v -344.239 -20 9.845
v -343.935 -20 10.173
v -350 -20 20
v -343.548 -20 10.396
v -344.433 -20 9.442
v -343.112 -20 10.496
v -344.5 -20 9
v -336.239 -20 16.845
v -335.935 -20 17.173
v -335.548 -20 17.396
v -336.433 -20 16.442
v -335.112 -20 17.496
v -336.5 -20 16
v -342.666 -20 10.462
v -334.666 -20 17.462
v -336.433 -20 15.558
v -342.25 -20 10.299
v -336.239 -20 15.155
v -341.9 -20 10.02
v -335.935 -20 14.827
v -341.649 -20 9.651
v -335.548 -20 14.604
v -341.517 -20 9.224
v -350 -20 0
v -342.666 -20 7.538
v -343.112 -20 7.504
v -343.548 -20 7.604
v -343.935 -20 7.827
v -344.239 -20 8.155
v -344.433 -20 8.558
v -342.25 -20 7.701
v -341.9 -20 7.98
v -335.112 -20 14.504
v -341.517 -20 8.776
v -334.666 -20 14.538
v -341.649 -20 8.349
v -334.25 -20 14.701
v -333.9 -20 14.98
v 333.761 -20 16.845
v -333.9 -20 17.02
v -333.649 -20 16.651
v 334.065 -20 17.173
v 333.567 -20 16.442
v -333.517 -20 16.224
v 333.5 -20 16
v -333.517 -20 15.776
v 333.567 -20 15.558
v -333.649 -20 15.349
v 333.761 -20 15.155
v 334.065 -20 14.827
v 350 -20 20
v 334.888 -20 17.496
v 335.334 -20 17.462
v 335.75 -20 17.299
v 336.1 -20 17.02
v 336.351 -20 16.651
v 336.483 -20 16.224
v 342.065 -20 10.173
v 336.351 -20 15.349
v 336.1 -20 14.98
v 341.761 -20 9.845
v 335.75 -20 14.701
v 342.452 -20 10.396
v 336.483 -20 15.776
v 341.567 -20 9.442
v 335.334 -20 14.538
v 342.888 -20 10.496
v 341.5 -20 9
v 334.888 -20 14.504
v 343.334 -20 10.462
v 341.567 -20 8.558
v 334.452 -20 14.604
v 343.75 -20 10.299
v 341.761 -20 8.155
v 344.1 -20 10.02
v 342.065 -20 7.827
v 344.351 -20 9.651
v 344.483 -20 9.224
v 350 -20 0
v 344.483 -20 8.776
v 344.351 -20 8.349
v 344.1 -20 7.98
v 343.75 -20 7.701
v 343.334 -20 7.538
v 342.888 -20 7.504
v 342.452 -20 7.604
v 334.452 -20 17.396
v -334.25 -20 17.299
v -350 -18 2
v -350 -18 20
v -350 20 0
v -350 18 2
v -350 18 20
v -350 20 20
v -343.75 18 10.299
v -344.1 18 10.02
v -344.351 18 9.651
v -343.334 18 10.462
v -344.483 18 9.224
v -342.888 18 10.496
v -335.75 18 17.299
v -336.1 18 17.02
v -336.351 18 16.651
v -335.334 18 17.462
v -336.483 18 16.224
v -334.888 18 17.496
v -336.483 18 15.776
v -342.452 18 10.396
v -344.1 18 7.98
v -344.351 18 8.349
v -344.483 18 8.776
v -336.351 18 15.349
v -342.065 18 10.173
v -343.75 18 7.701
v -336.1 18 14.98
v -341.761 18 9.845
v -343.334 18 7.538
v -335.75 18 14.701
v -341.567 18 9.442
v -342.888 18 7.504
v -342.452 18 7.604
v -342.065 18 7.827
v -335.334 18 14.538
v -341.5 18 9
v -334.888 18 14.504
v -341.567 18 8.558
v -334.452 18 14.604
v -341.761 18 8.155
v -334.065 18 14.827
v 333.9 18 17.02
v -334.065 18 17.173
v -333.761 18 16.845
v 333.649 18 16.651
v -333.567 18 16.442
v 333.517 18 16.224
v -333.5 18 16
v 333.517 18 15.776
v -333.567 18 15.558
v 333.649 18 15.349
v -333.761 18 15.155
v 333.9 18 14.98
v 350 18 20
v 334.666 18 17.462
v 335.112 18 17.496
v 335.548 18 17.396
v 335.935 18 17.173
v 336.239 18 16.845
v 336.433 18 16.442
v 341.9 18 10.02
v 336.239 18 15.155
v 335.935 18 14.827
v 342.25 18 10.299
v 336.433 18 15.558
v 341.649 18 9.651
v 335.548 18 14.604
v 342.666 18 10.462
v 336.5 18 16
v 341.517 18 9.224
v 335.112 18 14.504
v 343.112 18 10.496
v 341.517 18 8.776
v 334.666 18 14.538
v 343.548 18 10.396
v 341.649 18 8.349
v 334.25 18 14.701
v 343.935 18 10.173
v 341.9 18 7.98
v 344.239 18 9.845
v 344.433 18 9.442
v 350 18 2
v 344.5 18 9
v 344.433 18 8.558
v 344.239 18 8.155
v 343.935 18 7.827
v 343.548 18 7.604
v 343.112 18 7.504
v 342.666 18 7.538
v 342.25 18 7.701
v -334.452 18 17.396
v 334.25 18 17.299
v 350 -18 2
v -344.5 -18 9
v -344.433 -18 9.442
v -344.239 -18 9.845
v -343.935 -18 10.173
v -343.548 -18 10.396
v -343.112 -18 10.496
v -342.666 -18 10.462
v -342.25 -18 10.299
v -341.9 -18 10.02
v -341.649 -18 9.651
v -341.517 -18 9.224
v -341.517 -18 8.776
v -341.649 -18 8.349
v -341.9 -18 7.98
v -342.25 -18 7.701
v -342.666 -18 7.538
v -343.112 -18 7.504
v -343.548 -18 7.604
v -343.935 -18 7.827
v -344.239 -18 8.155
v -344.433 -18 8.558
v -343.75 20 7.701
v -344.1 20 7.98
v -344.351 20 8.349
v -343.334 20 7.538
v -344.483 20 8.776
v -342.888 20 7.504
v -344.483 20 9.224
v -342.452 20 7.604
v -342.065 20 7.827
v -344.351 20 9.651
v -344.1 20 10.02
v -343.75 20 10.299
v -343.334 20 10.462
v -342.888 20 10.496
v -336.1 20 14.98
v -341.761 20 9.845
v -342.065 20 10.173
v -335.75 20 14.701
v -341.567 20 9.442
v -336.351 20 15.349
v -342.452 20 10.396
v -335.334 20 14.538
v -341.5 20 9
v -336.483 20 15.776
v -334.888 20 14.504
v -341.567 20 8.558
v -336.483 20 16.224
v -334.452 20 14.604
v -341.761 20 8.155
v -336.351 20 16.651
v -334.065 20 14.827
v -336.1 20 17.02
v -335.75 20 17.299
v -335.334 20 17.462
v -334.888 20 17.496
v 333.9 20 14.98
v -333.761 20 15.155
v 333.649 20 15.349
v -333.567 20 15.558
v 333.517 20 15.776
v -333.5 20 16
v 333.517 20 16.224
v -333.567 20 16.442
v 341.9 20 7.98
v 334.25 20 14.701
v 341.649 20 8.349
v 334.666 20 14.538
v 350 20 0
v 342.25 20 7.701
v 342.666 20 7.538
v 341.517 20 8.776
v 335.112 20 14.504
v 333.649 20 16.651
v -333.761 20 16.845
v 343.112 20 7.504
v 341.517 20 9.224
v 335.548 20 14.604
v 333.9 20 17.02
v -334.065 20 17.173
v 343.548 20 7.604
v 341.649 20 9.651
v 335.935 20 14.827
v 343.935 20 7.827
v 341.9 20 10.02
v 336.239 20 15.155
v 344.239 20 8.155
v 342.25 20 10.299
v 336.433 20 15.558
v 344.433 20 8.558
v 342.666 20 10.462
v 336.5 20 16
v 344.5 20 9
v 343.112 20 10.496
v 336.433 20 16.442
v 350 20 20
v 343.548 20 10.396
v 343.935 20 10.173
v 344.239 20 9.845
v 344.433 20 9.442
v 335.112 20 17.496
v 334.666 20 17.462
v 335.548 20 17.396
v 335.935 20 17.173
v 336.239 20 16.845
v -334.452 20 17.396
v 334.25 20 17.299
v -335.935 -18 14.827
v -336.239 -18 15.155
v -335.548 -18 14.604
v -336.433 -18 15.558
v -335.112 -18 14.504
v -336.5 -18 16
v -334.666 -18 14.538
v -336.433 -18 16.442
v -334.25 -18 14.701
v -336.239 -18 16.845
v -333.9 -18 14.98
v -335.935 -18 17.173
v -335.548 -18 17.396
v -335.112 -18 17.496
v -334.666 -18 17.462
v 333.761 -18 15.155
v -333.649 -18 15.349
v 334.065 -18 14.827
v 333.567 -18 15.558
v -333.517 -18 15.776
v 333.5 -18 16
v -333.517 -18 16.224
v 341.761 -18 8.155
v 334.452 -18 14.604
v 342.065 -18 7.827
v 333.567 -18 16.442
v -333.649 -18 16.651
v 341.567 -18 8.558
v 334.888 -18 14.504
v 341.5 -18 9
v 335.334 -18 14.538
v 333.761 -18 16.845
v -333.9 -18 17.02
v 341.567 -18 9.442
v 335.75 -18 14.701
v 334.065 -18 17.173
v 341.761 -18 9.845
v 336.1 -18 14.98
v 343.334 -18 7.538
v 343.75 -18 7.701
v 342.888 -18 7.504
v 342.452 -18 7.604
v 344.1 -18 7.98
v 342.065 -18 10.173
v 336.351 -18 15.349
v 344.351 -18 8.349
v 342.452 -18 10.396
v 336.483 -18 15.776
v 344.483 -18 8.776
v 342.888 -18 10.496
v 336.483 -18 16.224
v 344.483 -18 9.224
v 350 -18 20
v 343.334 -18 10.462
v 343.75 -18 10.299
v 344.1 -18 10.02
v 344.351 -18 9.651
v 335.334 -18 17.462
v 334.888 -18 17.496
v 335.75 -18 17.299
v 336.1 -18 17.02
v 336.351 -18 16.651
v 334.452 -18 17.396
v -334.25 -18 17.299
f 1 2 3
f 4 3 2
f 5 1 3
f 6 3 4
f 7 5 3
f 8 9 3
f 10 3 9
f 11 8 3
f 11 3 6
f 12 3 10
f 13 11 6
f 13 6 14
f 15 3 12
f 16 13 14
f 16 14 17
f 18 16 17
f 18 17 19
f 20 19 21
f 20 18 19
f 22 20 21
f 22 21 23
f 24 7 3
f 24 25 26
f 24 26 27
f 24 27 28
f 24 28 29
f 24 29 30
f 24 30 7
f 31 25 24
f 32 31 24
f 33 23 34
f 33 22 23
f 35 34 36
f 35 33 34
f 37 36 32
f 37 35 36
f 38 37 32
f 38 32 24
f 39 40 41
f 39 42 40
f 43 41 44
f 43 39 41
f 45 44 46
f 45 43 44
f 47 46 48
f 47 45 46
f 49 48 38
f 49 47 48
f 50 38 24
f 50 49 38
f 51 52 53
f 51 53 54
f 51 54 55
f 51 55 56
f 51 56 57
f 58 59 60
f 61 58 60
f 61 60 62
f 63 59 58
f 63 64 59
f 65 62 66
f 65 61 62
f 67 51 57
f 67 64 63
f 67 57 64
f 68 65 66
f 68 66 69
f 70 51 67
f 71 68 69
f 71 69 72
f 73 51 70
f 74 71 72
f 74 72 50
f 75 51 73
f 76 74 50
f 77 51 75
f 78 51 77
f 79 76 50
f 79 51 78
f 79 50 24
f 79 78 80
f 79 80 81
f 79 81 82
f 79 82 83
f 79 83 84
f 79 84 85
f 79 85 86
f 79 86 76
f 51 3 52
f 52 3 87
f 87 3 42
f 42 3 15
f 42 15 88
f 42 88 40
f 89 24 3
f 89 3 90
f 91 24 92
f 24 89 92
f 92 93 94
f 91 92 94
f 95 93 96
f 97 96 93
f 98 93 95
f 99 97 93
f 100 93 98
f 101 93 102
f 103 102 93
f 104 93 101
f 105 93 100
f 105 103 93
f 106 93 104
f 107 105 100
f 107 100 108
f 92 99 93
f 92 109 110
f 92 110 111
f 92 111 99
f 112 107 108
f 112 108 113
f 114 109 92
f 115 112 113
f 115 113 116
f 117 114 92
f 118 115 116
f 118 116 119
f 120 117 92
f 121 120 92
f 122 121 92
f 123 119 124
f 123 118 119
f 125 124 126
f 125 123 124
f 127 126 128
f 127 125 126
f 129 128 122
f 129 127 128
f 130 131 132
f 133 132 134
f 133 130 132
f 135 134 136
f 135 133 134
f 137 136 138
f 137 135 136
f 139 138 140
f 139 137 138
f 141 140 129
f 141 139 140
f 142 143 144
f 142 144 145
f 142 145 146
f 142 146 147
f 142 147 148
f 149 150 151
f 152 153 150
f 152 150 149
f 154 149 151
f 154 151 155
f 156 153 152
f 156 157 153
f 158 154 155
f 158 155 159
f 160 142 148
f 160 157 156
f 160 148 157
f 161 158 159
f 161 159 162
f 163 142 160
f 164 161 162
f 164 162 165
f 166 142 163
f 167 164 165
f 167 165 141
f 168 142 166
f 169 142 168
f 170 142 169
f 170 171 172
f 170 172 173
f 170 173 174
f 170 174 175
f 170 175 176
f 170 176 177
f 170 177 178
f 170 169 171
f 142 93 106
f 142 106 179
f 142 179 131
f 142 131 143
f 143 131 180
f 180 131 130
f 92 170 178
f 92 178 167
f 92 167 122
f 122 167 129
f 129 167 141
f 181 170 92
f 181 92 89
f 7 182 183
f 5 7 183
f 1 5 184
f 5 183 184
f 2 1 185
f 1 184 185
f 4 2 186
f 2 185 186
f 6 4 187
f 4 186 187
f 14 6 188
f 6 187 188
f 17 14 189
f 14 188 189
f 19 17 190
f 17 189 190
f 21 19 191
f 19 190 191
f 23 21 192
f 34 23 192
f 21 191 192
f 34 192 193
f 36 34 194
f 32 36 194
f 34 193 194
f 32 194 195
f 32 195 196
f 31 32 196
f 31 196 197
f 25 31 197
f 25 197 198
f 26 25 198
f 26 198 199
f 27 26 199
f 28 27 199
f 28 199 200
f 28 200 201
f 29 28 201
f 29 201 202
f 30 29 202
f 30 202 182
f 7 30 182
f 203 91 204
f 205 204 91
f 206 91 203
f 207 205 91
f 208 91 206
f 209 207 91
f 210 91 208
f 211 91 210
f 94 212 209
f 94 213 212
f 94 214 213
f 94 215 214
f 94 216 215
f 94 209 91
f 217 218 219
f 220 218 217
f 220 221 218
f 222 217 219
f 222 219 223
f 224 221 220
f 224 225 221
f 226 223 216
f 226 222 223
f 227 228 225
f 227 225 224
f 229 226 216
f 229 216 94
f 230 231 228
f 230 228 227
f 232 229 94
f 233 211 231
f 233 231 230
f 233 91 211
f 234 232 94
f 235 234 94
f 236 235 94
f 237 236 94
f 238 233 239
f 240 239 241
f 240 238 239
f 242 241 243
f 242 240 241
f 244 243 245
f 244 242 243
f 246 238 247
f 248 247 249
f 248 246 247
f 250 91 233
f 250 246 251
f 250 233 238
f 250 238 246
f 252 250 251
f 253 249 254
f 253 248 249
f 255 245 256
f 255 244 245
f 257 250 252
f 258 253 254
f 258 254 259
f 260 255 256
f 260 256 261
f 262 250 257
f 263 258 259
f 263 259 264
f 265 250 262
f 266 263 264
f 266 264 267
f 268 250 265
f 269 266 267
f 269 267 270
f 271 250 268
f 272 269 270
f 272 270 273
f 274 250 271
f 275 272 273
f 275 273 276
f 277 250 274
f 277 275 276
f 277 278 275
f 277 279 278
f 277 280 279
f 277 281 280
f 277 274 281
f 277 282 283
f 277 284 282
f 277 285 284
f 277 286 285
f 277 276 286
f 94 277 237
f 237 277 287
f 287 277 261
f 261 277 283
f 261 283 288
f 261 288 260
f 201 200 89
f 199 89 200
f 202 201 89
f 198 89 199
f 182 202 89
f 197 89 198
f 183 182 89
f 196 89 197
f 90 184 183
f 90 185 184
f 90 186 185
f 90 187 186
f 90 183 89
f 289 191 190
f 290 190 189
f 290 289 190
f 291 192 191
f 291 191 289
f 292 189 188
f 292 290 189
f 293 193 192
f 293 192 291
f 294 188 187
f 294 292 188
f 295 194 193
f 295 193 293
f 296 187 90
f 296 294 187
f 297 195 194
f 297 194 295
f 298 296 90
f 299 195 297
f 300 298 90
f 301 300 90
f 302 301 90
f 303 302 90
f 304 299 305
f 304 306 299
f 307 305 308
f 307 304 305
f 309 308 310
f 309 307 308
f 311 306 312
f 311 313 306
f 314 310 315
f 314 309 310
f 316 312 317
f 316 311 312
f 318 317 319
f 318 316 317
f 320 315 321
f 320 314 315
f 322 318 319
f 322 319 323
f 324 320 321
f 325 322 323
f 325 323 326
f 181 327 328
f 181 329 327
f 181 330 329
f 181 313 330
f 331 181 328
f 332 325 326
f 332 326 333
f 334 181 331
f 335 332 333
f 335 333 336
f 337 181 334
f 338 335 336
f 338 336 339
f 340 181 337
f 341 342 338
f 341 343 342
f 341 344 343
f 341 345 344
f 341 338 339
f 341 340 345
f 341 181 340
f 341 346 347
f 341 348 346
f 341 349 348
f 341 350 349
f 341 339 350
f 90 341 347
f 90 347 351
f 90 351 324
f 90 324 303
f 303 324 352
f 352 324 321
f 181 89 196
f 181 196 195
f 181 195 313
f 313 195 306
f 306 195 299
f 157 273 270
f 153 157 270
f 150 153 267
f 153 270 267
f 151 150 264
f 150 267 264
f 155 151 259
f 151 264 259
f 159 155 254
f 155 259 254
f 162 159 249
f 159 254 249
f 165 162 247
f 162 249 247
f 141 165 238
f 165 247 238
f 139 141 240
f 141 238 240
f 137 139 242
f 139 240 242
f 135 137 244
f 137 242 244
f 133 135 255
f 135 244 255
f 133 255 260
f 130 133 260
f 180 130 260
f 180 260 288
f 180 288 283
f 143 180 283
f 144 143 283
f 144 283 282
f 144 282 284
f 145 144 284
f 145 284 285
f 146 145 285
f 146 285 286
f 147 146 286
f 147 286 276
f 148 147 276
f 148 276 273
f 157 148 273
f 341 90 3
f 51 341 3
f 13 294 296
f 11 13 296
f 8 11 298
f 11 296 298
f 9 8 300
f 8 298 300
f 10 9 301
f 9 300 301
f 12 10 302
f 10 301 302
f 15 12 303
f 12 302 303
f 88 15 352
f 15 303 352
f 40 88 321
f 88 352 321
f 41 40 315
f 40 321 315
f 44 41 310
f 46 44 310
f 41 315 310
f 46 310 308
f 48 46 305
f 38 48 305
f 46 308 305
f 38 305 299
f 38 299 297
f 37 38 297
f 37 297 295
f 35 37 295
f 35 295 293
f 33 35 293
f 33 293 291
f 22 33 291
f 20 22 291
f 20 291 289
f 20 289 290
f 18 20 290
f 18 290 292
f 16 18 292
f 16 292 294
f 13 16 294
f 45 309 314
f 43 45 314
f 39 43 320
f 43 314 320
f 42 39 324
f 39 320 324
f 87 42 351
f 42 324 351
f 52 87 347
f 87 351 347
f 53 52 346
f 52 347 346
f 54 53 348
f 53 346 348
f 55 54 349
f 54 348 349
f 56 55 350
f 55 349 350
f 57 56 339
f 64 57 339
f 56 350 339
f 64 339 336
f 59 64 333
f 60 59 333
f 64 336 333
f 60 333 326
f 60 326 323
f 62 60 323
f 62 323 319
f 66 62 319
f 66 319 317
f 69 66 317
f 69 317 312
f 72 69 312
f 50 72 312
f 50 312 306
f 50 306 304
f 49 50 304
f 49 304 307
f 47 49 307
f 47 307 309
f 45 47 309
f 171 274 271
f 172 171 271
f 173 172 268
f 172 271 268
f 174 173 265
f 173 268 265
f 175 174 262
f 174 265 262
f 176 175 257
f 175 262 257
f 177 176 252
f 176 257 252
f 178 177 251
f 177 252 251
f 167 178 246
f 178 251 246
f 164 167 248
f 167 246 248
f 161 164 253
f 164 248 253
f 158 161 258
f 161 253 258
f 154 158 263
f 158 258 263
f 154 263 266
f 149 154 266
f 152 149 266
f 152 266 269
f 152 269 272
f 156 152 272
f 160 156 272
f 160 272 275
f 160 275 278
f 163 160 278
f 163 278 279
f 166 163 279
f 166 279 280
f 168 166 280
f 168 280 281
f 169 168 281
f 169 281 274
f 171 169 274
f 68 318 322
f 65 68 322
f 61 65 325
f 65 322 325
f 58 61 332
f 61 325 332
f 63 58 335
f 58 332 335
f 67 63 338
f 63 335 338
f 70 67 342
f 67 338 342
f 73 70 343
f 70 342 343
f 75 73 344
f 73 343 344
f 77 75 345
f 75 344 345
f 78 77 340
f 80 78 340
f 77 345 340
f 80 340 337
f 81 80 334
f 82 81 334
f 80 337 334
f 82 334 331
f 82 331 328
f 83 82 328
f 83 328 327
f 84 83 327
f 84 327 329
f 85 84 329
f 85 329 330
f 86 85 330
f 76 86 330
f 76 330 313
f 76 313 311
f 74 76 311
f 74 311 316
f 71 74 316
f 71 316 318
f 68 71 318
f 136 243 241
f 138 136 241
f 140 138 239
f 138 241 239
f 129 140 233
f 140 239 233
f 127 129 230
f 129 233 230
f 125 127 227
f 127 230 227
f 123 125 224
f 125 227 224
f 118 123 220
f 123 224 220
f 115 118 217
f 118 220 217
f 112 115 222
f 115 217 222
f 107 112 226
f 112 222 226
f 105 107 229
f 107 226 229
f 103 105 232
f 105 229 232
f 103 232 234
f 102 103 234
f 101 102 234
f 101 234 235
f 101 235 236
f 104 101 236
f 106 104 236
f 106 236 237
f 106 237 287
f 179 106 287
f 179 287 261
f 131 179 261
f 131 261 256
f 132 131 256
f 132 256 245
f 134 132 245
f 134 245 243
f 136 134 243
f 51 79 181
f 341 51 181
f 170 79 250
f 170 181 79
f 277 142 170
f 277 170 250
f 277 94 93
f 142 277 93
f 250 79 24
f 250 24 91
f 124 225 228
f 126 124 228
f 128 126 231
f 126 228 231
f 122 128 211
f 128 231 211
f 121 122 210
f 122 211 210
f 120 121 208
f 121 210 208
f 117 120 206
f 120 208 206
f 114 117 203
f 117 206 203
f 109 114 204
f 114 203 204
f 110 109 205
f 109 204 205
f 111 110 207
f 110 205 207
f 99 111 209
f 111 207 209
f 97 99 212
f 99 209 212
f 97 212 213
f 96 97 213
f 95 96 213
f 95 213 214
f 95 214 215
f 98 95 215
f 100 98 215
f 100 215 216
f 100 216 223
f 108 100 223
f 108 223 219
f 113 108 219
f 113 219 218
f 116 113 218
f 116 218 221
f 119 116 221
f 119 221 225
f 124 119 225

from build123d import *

# Parameters (mm, degrees)
F1_DEPTH      = 350
F1_DEPTH_BACK = 350
F3_D          = 3
F3_DEPTH      = 50
F3_TIP        = 0.9012909285
F4_D          = 3
F4_DEPTH      = 50
F4_START      = 36
F4_TIP        = 0.9012909285


with BuildPart() as f1:
    # F0 (on Right) → F1 (new body, two sides)
    with BuildSketch(Plane.YZ) as f1_sk:
        Polygon((-20, 20), (-20, 0), (20, 0), (20, 20), (18, 20), (18, 2), (-18, 2), (-18, 20), align=None)
    extrude(amount=F1_DEPTH)
    extrude(f1_sk.sketch, amount=-F1_DEPTH_BACK)

    # F3 (one way)
    with BuildSketch(Plane(origin=(0, -18, 0), x_dir=(-1, 0, 0), z_dir=(0, 1, 0))):
        with Locations((-343, 9), (343, 9), (335, 16), (-335, 16)):
            Circle(F3_D / 2)
    extrude(amount=-F3_DEPTH, mode=Mode.SUBTRACT)
    with Locations(Plane(origin=(0, -18, 0), x_dir=(-1, 0, 0), z_dir=(0, 1, 0))):
        with Locations((-343, 9), (343, 9), (335, 16), (-335, 16)):
            with Locations((0, 0, -(F3_DEPTH + F3_TIP / 2))):  # 118° drill point
                Cone(0, F3_D / 2, F3_TIP, mode=Mode.SUBTRACT)

    # F4
    # its depths count from where the whole tool has entered the part; down to there all is cleared
    with Locations(Plane(origin=(0, -18, 0), x_dir=(-1, 0, 0), z_dir=(0, -1, 0)).offset(-F4_START)):
        with Locations((-343, -9), (343, -9), (-335, -16), (335, -16)):
            Hole(F4_D / 2, depth=F4_DEPTH)
            with Locations((0, 0, -(F4_DEPTH + F4_TIP / 2))):  # 118° drill point
                Cone(0, F4_D / 2, F4_TIP, mode=Mode.SUBTRACT)


solid = f1.part
